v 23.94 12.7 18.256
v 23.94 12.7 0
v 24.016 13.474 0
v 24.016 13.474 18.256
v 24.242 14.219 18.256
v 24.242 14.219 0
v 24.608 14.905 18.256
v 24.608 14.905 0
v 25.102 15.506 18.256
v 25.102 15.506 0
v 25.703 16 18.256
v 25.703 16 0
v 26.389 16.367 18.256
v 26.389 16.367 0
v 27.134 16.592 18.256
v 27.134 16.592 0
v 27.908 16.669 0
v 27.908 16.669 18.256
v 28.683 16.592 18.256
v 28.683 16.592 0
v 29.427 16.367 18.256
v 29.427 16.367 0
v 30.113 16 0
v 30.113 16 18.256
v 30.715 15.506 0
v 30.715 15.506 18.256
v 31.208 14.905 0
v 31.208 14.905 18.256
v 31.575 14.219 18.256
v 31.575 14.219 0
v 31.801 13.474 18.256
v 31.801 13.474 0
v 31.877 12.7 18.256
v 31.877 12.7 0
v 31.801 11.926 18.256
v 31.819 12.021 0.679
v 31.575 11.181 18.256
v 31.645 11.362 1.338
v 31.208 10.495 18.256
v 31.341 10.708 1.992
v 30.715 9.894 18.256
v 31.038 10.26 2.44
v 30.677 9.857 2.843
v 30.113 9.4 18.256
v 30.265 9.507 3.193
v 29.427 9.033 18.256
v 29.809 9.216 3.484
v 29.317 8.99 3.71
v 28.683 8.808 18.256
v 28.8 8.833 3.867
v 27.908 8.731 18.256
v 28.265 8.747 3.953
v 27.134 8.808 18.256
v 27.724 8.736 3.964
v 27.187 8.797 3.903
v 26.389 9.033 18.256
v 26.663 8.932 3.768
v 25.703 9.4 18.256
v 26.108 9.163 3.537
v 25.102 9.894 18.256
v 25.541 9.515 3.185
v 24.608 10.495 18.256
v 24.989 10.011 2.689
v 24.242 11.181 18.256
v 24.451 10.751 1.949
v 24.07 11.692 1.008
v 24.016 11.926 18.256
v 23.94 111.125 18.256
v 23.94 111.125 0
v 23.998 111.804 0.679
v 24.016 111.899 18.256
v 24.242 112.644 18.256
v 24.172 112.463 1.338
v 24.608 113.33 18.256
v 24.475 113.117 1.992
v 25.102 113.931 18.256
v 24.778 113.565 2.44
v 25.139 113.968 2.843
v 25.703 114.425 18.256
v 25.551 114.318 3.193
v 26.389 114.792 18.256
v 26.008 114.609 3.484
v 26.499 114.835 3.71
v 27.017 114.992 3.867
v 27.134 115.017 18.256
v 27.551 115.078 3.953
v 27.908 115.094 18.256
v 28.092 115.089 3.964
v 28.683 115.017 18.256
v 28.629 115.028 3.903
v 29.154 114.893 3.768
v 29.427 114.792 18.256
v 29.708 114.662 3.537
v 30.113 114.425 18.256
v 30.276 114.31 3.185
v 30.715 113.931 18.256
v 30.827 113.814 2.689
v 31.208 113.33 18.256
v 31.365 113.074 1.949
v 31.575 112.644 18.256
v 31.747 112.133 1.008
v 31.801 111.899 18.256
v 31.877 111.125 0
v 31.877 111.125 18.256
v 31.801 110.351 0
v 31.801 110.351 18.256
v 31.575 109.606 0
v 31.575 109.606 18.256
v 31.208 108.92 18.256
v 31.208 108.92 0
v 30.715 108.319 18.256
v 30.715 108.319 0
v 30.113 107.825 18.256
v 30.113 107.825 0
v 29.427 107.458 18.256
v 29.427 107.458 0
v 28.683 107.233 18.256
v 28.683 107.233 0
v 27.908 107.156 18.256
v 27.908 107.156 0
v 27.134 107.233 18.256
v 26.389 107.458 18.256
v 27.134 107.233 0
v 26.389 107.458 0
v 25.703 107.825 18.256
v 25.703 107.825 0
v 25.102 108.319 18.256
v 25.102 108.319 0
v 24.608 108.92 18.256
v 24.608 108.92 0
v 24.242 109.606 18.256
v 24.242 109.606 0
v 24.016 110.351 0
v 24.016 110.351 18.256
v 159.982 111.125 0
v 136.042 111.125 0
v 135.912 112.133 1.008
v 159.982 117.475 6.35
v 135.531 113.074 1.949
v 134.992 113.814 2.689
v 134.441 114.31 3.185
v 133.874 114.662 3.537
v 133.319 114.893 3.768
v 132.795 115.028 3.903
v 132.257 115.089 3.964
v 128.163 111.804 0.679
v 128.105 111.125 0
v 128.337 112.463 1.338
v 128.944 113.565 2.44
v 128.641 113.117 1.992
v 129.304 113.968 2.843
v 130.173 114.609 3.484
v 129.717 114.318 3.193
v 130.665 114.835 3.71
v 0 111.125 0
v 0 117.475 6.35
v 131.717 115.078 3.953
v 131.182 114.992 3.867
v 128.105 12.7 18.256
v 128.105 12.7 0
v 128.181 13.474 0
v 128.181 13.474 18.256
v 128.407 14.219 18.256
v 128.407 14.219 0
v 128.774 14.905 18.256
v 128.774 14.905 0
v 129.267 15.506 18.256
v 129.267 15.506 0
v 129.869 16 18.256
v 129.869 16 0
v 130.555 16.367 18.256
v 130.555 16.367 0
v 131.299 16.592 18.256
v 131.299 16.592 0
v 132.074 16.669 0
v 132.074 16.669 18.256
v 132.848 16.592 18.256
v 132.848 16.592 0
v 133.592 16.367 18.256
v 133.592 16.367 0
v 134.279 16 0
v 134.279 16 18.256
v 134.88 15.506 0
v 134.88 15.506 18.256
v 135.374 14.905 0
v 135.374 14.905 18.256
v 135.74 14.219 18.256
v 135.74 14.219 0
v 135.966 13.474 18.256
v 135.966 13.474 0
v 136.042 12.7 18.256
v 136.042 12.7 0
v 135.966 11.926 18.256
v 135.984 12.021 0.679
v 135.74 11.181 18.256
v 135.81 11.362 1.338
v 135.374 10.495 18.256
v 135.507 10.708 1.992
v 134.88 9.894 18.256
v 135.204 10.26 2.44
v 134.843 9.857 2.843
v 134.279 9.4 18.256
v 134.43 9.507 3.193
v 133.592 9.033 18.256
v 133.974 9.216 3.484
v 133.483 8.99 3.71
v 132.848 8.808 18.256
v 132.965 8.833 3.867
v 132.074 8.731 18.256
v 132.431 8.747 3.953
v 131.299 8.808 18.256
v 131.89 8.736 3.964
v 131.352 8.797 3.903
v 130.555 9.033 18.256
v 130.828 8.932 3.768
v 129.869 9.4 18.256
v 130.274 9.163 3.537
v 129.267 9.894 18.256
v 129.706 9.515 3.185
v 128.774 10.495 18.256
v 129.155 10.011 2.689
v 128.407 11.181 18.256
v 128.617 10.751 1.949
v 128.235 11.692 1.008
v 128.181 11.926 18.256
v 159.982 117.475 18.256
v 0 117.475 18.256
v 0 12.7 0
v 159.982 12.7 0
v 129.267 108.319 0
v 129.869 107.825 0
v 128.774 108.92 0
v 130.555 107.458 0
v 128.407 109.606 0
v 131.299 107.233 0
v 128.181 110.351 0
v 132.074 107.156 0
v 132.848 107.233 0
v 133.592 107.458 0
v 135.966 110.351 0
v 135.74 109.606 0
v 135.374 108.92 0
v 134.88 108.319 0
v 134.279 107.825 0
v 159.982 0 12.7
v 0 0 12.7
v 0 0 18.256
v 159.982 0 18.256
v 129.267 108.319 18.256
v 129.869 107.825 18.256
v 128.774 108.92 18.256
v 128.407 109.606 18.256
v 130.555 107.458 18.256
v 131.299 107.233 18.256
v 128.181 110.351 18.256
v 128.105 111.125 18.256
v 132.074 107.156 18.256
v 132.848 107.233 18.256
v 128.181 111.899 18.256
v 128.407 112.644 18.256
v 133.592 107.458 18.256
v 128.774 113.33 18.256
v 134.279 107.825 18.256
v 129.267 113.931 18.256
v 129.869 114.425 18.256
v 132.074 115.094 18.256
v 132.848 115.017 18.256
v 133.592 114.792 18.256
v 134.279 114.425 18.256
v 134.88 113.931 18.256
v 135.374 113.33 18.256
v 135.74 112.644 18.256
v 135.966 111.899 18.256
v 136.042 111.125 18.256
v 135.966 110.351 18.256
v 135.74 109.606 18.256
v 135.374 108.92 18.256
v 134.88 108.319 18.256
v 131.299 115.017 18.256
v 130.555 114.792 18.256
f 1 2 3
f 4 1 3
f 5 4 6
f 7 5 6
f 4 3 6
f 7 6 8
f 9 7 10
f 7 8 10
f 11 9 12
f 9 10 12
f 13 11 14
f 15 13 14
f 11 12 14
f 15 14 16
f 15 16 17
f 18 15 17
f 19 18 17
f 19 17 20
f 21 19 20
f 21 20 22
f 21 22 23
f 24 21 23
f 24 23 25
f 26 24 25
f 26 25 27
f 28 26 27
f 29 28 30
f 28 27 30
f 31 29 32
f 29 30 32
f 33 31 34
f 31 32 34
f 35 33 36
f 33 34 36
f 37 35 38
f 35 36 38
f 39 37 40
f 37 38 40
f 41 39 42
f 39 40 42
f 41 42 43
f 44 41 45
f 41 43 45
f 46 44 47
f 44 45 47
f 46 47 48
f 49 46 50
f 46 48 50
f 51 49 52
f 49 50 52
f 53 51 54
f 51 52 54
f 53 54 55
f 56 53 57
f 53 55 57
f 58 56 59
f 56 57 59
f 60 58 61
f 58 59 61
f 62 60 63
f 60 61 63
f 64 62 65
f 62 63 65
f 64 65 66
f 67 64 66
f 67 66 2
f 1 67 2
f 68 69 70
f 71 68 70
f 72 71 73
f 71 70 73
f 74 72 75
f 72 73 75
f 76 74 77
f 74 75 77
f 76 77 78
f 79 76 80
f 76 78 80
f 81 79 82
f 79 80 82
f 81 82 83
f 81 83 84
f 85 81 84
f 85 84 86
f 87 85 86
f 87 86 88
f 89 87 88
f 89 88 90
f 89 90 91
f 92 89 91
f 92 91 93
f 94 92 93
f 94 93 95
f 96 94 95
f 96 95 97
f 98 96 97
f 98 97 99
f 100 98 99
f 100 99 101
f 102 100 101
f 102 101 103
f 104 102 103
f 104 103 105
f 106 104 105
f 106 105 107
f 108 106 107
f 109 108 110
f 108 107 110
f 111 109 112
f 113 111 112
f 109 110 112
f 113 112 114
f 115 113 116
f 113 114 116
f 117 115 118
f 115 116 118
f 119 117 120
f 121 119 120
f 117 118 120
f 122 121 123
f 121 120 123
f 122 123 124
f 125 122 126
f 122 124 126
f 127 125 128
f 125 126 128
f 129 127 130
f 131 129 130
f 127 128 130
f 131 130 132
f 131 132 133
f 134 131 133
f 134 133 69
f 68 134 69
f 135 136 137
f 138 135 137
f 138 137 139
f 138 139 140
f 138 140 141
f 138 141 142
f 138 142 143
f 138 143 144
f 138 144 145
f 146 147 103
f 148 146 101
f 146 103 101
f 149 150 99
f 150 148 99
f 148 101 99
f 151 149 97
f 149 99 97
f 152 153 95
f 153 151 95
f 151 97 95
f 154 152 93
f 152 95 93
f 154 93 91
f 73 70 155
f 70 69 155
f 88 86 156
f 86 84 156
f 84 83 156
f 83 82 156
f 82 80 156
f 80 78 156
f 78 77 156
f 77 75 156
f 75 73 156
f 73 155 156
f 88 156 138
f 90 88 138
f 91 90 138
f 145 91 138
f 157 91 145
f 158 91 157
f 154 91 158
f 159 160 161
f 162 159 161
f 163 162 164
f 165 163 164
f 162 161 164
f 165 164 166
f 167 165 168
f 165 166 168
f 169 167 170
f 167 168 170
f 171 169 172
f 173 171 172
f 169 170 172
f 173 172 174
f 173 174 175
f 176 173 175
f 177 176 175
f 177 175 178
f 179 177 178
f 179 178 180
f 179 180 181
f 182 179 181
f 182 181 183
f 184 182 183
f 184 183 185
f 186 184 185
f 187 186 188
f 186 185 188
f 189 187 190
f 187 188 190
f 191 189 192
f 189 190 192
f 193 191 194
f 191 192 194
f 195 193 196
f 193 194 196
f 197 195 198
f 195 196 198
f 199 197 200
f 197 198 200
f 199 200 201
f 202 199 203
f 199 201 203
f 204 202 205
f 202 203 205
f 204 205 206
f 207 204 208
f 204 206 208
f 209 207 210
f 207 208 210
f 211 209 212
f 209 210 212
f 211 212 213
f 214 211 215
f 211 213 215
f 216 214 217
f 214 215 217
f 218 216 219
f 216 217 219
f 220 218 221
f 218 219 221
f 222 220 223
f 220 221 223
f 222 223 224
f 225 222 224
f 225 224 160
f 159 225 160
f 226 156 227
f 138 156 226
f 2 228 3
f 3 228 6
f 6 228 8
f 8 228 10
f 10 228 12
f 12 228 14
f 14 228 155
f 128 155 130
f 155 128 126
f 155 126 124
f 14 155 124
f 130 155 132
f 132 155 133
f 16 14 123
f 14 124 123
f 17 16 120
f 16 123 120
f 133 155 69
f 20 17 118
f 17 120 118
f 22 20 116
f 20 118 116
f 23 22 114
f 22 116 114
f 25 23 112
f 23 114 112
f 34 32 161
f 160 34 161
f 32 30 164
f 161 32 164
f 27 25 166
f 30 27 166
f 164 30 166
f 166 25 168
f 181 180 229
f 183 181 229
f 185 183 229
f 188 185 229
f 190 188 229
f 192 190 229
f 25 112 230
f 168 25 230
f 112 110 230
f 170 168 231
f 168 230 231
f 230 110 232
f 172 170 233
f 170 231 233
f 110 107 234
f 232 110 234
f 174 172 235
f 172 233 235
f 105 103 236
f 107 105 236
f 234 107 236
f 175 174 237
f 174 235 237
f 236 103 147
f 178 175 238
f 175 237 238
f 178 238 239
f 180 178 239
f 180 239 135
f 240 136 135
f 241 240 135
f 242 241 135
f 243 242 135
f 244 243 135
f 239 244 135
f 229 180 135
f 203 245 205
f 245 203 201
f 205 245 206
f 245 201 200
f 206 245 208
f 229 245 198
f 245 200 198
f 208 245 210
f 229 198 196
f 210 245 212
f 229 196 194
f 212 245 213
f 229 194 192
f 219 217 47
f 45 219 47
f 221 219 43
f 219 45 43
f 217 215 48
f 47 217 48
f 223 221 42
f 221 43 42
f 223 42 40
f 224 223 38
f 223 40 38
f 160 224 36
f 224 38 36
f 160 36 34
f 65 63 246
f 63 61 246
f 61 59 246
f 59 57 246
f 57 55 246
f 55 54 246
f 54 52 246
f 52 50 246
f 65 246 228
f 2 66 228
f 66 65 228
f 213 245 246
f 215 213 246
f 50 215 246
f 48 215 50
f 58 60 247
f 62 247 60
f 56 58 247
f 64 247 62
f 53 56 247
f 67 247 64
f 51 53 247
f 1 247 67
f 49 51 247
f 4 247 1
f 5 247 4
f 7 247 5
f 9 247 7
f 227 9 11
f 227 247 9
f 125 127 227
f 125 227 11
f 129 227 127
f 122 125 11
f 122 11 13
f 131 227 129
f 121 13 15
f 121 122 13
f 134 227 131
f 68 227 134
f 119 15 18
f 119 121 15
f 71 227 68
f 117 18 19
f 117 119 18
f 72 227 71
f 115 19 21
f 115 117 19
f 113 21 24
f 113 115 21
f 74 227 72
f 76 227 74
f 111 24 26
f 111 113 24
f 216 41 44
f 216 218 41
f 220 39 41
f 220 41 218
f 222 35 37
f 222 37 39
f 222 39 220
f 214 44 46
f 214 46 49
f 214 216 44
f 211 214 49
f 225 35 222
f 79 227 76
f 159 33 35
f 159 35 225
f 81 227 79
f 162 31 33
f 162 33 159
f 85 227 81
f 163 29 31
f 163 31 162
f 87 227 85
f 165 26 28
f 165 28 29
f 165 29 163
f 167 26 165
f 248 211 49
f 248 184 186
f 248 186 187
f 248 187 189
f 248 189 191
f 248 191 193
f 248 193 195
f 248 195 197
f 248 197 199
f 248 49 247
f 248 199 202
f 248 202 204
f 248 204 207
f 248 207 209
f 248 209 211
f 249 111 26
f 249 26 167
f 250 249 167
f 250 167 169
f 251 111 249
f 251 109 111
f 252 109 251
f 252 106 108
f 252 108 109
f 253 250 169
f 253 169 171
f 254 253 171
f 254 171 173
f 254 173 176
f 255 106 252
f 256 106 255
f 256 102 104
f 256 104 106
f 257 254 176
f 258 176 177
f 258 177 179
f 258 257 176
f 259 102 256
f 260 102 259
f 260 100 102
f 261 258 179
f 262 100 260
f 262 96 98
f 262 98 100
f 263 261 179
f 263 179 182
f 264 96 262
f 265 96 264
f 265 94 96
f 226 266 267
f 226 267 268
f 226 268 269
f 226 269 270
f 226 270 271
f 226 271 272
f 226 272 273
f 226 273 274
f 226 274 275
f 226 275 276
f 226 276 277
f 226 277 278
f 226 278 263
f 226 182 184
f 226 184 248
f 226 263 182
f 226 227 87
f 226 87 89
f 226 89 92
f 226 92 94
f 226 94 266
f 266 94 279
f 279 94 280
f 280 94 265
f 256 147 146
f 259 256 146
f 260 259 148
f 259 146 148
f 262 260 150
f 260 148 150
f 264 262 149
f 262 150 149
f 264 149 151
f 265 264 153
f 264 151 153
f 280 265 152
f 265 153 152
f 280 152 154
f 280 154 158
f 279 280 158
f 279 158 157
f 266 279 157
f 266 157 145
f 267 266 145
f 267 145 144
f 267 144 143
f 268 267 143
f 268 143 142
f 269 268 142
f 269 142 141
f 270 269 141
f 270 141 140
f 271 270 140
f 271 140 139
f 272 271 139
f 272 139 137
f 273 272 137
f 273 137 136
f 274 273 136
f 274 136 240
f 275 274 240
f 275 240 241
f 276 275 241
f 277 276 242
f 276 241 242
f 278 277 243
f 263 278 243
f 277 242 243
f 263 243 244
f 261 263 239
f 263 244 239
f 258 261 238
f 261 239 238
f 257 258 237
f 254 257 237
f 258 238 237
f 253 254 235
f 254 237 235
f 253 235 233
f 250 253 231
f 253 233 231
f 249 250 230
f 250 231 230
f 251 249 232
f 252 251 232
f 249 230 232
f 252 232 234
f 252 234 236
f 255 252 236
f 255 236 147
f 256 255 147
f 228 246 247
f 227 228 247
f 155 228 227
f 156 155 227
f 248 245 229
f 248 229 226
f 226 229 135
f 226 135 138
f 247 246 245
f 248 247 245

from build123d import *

# Parameters (mm, degrees)
F0_W        = 159.9819
F0_H        = 117.475
F1_DEPTH    = 18.25625
F3_D        = 7.9375
F5_D        = 7.9375
F6_T1_DEPTH = 225.3026478943
F7_T1_DEPTH = 192.6422739472


# Not quite as in the source:
# - a fillet or chamfer that OpenCascade refuses, or shapes differently, is made with other operations: its cross-section is extruded or revolved along the edge and cut away or added


with BuildPart() as f1:
    # F0 (on Top) → F1 (new body)
    with BuildSketch(Plane.XY):
        with Locations((79.99095, 58.7375)):
            Rectangle(F0_W, F0_H)
    extrude(amount=F1_DEPTH)

    # F3 (through all)
    with Locations(Plane.XY.offset(18.25625)):
        with Locations((27.90825, 12.7), (132.07365, 12.7)):
            Hole(F3_D / 2)

    # F5 (through all)
    with Locations(Plane.XY.offset(18.25625)):
        with Locations((27.90825, 111.125), (132.07365, 111.125)):
            Hole(F5_D / 2)

    # F6: chamfer of 12.7 on 1 edges, made by hand

    # F6_s2 → F6_t1 (cut)
    with BuildSketch(Plane.YZ.offset(-32.6603739472)):
        Polygon((0, 12.7), (12.7, 0), (0, 0), align=None)
    extrude(amount=F6_T1_DEPTH, mode=Mode.SUBTRACT)

    # F7: chamfer of 6.35 on 1 edges, made by hand

    # F7_s2 → F7_t1 (cut)
    with BuildSketch(Plane.YZ.offset(-16.3301869736)):
        Polygon((111.125, 0), (117.475, 6.35), (117.475, 0), align=None)
    extrude(amount=F7_T1_DEPTH, mode=Mode.SUBTRACT)


solid = f1.part
